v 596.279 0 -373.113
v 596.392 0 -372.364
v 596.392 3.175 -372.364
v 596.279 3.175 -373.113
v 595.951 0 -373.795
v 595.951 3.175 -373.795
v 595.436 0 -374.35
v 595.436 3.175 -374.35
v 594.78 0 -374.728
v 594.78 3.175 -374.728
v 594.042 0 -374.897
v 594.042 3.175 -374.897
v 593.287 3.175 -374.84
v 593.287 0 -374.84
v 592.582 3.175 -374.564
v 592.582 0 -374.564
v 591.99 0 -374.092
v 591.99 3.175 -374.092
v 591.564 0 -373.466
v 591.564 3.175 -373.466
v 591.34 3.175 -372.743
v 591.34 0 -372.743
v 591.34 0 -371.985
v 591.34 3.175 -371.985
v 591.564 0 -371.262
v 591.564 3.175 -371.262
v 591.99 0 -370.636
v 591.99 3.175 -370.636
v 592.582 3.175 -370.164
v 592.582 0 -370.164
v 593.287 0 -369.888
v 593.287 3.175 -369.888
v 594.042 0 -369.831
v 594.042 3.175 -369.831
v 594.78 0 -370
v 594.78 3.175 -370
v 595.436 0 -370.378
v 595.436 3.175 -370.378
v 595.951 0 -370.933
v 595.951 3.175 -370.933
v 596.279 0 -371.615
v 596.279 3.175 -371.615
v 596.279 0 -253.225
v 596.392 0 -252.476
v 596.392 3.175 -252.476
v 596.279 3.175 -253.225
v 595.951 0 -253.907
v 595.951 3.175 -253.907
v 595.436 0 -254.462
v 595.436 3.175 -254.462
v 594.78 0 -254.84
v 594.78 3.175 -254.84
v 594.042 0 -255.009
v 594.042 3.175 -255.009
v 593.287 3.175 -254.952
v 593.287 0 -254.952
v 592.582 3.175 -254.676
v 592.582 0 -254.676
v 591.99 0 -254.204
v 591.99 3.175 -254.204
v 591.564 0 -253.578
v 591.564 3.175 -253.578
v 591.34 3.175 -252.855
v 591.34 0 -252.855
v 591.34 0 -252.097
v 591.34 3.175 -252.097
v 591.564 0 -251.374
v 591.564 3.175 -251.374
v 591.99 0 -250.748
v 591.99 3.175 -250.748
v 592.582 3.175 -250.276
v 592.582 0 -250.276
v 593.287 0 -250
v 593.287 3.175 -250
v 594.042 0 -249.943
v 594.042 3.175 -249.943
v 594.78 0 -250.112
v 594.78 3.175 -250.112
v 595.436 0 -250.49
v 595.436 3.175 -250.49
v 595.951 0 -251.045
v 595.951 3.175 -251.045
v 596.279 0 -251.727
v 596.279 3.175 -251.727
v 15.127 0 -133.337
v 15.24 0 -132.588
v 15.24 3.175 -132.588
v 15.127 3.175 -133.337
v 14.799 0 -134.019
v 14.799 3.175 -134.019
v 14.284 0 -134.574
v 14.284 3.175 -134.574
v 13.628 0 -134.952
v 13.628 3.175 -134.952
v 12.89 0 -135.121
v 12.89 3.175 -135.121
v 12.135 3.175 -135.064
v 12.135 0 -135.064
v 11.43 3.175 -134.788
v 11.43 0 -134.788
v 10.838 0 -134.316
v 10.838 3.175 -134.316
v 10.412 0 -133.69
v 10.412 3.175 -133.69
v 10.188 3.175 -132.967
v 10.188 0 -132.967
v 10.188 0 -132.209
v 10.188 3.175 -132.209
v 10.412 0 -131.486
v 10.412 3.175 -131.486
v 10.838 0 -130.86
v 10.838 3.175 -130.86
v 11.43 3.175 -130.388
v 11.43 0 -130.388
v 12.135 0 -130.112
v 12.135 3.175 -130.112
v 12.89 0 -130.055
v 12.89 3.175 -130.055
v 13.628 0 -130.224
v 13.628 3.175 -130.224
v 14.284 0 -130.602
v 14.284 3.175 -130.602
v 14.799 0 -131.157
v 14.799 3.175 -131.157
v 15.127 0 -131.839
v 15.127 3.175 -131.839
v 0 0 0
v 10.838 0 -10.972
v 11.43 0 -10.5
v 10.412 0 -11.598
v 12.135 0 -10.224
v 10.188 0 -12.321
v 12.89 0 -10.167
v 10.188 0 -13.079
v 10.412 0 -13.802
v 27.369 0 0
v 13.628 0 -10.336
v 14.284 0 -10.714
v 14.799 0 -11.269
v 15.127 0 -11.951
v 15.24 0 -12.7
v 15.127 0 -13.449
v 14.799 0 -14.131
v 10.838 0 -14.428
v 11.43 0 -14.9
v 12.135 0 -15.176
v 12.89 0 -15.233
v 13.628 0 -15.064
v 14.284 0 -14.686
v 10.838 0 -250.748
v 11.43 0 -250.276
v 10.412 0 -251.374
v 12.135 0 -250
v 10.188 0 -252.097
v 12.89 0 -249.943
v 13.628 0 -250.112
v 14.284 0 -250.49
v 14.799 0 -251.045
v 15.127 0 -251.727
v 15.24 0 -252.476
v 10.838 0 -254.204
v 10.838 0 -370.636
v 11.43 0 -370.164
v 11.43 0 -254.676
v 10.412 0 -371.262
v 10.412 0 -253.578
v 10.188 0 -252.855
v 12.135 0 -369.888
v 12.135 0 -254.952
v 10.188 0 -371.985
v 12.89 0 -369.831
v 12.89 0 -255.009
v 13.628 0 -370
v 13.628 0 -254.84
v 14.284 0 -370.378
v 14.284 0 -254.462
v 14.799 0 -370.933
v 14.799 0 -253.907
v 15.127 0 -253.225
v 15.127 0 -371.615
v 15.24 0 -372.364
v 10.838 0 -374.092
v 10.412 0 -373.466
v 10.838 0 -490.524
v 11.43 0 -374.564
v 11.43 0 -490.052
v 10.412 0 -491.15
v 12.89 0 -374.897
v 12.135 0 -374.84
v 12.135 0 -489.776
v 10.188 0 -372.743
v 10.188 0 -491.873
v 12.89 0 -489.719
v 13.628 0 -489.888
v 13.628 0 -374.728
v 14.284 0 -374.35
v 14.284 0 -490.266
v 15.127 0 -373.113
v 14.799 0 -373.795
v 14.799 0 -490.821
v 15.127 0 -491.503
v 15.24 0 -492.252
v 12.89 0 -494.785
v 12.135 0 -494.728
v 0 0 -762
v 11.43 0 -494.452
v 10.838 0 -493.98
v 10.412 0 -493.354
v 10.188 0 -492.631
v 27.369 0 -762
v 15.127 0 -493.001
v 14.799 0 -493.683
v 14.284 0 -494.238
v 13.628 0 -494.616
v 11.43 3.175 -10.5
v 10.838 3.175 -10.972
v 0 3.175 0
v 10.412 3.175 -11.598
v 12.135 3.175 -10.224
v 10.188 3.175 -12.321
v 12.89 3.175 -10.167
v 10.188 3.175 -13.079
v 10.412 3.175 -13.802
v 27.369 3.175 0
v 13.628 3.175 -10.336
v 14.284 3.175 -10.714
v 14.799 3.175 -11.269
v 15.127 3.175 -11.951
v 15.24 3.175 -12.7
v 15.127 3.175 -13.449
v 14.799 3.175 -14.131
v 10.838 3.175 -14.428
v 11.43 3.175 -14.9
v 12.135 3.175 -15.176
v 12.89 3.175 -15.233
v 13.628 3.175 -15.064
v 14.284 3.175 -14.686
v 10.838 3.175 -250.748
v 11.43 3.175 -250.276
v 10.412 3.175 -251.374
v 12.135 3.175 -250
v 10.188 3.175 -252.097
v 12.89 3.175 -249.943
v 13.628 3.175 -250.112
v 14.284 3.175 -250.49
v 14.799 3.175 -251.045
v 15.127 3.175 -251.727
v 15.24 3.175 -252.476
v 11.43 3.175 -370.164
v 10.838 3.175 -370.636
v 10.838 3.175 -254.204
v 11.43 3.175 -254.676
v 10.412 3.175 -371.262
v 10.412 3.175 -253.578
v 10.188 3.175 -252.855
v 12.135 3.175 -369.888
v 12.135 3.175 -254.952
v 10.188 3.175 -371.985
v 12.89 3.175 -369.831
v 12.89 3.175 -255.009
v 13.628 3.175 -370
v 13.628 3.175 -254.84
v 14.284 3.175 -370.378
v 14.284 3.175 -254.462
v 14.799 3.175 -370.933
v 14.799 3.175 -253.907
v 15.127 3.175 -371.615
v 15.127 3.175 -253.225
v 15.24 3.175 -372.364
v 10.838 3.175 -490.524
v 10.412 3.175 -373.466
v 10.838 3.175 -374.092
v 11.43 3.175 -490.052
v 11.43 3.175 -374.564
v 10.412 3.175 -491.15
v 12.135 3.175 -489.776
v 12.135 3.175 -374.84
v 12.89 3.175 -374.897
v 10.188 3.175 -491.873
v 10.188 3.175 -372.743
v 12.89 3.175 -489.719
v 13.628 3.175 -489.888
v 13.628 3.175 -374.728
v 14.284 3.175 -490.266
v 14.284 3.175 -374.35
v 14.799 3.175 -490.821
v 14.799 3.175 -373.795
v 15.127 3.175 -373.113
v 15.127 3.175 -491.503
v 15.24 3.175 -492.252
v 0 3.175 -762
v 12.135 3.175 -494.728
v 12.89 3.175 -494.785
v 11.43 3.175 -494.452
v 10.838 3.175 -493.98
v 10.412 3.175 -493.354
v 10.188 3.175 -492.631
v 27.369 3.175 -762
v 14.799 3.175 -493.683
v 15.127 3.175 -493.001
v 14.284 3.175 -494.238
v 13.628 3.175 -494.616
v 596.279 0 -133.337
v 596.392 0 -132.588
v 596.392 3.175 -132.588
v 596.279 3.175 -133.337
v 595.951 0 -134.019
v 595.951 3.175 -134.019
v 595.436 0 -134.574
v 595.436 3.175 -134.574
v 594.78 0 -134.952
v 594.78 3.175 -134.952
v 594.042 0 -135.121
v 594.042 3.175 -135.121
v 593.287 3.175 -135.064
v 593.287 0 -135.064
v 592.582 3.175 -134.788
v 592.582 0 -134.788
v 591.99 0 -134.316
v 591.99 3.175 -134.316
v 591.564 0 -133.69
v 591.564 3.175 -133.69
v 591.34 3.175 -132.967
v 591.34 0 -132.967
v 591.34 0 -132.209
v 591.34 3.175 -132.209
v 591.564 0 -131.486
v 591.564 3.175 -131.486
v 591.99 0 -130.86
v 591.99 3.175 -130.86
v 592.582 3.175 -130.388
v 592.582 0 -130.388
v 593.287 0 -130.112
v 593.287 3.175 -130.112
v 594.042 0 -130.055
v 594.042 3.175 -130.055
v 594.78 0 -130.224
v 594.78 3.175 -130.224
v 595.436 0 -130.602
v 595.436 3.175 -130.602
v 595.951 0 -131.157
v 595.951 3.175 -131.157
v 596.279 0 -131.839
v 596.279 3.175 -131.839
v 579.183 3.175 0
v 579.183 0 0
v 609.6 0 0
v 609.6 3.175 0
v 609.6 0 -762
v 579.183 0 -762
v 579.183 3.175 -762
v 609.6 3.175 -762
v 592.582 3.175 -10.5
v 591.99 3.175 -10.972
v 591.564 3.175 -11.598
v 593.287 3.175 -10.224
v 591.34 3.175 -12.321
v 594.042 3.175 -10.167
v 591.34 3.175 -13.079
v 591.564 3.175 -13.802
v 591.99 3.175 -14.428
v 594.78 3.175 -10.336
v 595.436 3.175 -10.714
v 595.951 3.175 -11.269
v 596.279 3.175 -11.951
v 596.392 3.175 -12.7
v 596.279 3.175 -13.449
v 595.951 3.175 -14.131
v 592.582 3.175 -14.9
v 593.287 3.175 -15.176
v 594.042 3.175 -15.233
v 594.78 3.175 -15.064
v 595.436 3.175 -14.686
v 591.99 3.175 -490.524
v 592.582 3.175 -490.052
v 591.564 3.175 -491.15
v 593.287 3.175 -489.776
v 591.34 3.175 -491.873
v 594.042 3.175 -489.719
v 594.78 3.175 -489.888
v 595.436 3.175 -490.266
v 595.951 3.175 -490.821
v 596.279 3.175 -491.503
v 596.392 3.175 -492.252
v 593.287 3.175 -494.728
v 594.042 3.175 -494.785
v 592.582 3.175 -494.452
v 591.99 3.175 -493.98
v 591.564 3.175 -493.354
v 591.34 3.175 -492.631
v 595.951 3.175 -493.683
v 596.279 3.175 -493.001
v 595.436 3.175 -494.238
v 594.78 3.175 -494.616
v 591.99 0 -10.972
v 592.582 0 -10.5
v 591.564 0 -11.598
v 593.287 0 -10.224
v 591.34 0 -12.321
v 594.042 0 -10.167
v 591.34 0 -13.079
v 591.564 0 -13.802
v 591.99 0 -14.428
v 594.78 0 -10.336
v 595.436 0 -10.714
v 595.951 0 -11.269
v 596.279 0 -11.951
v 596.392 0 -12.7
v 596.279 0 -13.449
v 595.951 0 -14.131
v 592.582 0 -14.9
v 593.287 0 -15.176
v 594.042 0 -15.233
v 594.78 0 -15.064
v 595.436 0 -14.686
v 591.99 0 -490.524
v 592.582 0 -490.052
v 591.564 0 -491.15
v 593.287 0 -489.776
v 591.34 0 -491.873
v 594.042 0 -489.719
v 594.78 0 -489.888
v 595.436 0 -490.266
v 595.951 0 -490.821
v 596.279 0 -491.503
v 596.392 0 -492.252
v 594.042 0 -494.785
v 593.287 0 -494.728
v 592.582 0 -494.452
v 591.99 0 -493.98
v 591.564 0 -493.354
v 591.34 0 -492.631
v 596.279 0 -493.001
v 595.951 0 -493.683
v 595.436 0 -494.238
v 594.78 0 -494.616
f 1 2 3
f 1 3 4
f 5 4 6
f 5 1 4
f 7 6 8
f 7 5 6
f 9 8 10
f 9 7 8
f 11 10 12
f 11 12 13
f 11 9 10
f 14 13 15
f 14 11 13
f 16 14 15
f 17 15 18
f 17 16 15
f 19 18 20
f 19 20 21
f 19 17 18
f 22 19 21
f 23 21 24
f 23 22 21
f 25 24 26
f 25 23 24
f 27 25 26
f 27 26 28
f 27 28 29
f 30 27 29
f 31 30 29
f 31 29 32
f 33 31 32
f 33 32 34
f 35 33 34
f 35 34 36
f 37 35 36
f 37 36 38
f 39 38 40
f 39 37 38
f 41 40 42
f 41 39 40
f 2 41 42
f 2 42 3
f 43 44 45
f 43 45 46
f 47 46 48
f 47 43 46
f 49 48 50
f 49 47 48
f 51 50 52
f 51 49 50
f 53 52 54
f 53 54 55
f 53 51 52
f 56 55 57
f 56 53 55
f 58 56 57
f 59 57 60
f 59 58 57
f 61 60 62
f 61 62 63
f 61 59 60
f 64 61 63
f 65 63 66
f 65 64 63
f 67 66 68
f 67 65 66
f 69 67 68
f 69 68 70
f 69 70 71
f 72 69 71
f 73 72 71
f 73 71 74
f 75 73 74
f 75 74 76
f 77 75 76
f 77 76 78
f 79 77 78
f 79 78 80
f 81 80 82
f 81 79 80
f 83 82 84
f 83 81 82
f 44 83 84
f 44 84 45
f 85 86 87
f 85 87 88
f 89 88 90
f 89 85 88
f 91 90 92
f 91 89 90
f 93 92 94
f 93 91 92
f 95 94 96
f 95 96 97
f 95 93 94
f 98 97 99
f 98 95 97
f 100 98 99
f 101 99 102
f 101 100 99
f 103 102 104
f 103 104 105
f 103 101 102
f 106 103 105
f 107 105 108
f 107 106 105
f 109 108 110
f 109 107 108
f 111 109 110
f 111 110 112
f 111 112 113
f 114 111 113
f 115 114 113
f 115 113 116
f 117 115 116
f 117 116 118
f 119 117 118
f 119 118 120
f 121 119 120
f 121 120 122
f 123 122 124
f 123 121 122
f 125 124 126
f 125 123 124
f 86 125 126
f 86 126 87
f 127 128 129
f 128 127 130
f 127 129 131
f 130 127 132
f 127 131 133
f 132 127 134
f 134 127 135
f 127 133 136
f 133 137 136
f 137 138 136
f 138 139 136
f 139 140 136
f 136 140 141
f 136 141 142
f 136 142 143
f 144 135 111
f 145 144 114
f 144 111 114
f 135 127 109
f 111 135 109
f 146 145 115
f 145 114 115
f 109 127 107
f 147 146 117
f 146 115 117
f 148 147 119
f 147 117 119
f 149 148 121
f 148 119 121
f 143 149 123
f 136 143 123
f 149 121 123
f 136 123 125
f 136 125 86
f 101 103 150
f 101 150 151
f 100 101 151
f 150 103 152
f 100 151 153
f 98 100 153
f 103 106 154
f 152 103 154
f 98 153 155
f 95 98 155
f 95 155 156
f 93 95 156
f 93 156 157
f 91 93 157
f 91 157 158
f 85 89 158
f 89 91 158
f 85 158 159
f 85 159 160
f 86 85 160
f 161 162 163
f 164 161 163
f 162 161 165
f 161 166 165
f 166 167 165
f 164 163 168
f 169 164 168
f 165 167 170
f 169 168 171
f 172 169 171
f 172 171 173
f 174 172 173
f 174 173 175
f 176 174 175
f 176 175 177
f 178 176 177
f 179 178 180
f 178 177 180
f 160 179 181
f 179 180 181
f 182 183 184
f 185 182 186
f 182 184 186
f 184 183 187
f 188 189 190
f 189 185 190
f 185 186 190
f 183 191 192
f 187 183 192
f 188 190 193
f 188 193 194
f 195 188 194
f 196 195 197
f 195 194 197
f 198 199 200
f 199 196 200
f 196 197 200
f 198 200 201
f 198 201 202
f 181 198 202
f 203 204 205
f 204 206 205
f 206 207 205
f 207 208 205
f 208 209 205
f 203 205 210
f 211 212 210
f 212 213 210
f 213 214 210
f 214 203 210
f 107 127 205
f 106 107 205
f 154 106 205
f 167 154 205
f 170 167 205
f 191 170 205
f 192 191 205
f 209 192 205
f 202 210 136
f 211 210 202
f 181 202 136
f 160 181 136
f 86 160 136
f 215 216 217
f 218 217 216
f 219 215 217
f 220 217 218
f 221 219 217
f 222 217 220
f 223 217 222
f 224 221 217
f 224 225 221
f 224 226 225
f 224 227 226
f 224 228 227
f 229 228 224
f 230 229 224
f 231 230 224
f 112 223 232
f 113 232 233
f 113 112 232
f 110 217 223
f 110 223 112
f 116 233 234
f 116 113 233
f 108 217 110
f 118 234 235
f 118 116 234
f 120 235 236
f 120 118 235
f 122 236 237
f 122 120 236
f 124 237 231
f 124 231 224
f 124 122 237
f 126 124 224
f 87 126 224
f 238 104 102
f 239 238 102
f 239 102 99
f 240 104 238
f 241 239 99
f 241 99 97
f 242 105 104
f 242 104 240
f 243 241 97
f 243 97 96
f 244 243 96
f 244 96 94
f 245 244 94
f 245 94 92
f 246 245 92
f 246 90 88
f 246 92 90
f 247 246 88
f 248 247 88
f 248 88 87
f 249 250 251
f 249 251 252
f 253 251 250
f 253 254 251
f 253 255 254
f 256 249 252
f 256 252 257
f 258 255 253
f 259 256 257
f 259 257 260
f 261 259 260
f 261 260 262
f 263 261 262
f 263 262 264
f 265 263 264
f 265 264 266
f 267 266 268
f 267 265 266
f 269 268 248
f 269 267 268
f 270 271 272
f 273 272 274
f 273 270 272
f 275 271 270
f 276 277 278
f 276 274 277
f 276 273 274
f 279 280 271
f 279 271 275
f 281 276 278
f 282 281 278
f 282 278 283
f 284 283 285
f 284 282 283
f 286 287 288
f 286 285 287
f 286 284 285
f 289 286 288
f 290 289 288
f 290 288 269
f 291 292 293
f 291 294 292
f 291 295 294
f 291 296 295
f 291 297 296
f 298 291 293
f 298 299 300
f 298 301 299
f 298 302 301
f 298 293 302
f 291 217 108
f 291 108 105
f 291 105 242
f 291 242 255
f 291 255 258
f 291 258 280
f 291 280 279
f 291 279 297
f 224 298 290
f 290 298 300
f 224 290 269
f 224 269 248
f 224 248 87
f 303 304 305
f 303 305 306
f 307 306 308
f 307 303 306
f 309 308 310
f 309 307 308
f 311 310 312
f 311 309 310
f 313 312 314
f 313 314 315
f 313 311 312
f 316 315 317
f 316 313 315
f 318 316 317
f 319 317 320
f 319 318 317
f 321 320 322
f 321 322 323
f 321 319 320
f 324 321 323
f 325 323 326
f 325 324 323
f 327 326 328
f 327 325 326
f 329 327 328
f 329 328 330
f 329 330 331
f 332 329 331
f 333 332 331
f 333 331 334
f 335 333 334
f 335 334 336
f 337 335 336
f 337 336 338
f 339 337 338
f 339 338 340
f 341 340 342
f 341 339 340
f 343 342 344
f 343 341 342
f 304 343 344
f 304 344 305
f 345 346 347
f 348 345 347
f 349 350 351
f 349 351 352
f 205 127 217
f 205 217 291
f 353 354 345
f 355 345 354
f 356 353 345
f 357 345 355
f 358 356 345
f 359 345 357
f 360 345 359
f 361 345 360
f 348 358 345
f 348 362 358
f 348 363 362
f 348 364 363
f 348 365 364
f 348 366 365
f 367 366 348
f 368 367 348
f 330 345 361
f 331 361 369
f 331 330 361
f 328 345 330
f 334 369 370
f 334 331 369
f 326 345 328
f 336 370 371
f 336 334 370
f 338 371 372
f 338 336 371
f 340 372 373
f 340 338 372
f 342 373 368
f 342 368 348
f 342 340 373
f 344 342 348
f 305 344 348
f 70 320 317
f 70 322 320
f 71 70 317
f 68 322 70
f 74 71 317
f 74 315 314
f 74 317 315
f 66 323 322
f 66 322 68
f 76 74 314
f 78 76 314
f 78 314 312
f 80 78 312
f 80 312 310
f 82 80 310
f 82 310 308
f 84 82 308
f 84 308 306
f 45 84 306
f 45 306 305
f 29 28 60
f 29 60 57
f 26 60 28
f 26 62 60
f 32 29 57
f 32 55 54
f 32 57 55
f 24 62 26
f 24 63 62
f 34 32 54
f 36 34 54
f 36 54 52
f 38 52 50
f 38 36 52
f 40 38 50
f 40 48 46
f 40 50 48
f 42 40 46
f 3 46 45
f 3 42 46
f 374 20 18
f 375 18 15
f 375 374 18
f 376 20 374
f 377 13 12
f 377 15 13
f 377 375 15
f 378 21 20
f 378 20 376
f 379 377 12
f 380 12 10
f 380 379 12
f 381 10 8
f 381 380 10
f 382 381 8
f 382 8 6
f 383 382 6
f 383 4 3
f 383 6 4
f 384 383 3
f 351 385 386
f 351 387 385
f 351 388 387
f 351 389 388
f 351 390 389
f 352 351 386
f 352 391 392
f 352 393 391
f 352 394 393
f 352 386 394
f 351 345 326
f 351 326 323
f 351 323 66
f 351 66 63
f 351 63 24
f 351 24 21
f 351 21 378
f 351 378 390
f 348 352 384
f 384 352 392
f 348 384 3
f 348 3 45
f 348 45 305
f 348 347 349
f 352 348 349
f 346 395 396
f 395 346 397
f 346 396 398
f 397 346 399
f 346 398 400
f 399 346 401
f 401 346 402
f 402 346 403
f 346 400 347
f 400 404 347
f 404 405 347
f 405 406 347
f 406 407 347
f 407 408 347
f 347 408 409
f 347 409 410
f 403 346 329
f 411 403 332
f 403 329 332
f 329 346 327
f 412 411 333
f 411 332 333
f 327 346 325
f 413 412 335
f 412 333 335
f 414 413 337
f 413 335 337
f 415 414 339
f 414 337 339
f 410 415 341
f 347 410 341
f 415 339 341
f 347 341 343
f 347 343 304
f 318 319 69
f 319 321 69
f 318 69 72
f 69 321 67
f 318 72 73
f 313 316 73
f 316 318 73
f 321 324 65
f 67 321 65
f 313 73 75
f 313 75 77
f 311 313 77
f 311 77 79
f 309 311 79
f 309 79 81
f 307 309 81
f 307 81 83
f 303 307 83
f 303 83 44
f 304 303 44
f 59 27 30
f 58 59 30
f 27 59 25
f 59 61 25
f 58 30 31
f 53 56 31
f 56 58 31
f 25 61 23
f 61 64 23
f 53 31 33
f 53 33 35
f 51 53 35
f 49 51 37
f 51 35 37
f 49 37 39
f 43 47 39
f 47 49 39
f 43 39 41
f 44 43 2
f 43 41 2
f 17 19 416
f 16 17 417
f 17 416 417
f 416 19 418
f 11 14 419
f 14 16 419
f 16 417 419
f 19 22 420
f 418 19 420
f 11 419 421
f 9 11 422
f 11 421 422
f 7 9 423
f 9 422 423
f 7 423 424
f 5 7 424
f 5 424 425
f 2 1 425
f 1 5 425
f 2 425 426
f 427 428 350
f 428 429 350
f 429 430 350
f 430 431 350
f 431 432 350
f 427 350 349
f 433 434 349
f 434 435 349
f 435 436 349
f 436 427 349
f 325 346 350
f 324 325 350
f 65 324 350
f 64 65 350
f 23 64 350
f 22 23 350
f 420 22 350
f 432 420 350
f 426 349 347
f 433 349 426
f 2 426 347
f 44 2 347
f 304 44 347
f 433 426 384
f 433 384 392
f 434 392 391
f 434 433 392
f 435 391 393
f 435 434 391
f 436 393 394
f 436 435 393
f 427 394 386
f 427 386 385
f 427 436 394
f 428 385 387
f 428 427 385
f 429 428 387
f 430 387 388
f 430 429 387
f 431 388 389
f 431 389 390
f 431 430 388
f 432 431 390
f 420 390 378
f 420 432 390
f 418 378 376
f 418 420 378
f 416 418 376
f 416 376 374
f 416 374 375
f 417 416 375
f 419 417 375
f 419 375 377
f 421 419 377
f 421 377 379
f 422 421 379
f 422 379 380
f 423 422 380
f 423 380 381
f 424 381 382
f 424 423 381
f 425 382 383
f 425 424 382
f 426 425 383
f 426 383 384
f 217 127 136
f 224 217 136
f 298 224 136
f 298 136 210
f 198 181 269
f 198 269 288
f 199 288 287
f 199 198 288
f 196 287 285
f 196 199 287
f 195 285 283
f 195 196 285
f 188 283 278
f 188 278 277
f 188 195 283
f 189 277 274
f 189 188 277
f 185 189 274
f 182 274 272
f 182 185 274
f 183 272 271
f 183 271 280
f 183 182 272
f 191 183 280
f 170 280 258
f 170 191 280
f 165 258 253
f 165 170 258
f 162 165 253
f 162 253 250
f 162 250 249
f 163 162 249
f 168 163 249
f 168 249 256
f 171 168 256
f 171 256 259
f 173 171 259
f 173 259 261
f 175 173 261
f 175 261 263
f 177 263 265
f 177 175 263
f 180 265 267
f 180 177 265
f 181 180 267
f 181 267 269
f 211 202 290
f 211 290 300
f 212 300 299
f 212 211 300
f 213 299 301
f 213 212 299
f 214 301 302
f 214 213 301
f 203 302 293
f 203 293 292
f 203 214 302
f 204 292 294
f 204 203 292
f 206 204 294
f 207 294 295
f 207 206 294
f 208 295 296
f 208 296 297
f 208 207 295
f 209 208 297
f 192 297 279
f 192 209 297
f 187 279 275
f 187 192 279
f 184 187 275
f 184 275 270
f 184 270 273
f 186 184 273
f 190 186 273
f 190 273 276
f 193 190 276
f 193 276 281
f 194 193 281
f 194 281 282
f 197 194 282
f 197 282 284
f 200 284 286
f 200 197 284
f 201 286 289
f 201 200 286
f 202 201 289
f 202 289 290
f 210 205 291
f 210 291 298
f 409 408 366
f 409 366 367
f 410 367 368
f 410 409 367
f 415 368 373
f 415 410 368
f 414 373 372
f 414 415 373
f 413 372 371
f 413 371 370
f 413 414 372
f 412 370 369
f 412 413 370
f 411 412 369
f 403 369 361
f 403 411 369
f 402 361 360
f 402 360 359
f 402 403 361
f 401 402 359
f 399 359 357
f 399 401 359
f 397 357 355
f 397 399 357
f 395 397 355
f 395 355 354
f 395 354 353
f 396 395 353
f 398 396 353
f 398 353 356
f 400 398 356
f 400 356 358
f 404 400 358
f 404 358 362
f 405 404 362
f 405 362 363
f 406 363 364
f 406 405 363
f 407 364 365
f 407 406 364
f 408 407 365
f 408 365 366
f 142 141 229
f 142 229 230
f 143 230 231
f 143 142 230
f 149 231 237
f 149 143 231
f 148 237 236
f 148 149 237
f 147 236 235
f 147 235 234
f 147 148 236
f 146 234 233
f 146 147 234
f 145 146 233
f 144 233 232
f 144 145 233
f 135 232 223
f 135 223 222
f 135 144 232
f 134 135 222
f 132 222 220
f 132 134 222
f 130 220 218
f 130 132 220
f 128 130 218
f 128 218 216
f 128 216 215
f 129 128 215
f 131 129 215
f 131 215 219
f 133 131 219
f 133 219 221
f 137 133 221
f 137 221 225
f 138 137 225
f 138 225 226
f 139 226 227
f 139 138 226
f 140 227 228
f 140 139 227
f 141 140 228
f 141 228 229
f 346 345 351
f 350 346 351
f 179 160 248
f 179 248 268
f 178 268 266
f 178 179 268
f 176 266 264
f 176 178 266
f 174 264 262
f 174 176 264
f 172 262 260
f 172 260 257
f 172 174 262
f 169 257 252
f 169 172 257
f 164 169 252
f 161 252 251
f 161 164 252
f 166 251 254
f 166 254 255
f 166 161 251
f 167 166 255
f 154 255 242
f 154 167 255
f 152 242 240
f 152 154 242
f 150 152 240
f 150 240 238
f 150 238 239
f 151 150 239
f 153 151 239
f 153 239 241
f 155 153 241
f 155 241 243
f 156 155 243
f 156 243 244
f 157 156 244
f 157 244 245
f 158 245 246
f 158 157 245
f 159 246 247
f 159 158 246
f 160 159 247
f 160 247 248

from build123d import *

# Parameters (mm, degrees)
SKETCH1_W           = 609.6
SKETCH1_H           = 762
SKETCH1_R           = 2.54
BOSS_EXTRUDE1_DEPTH = 3.175
CUT_EXTRUDE1_REACH  = 5.175
SKETCH2_W           = 551.81483812
SKETCH2_H           = 762


with BuildPart() as part:
    # Sketch1 → Boss-Extrude1 (new body)
    with BuildSketch(Plane(origin=(0, 0, 0), x_dir=(1, 0, 0), z_dir=(0, 1, 0))):
        with Locations((304.8, 381)):
            Rectangle(SKETCH1_W, SKETCH1_H)
        with Locations((12.7, 12.7)):
            Circle(SKETCH1_R, mode=Mode.SUBTRACT)
        with Locations((593.852, 12.7)):
            Circle(SKETCH1_R, mode=Mode.SUBTRACT)
        with Locations((593.852, 132.588)):
            Circle(SKETCH1_R, mode=Mode.SUBTRACT)
        with Locations((593.852, 252.476)):
            Circle(SKETCH1_R, mode=Mode.SUBTRACT)
        with Locations((593.852, 372.364)):
            Circle(SKETCH1_R, mode=Mode.SUBTRACT)
        with Locations((593.852, 492.252)):
            Circle(SKETCH1_R, mode=Mode.SUBTRACT)
        with Locations((12.7, 132.588)):
            Circle(SKETCH1_R, mode=Mode.SUBTRACT)
        with Locations((12.7, 252.476)):
            Circle(SKETCH1_R, mode=Mode.SUBTRACT)
        with Locations((12.7, 372.364)):
            Circle(SKETCH1_R, mode=Mode.SUBTRACT)
        with Locations((12.7, 492.252)):
            Circle(SKETCH1_R, mode=Mode.SUBTRACT)
    extrude(amount=BOSS_EXTRUDE1_DEPTH)

    # Sketch2 → Cut-Extrude1 (cut, up to next)
    with BuildSketch(Plane(origin=(0, 3.175, 0), x_dir=(1, 0, 0), z_dir=(0, 1, 0)), mode=Mode.PRIVATE) as cut_extrude1_sk1:
        with Locations((303.276, 381)):
            Rectangle(SKETCH2_W, SKETCH2_H)
    cut_extrude1_tool1 = extrude(cut_extrude1_sk1.sketch, amount=-CUT_EXTRUDE1_REACH, mode=Mode.PRIVATE) & part.part
    add(cut_extrude1_tool1.solids().sort_by_distance((303.276, 3.175, -381))[0], mode=Mode.SUBTRACT)


solid = part.part
